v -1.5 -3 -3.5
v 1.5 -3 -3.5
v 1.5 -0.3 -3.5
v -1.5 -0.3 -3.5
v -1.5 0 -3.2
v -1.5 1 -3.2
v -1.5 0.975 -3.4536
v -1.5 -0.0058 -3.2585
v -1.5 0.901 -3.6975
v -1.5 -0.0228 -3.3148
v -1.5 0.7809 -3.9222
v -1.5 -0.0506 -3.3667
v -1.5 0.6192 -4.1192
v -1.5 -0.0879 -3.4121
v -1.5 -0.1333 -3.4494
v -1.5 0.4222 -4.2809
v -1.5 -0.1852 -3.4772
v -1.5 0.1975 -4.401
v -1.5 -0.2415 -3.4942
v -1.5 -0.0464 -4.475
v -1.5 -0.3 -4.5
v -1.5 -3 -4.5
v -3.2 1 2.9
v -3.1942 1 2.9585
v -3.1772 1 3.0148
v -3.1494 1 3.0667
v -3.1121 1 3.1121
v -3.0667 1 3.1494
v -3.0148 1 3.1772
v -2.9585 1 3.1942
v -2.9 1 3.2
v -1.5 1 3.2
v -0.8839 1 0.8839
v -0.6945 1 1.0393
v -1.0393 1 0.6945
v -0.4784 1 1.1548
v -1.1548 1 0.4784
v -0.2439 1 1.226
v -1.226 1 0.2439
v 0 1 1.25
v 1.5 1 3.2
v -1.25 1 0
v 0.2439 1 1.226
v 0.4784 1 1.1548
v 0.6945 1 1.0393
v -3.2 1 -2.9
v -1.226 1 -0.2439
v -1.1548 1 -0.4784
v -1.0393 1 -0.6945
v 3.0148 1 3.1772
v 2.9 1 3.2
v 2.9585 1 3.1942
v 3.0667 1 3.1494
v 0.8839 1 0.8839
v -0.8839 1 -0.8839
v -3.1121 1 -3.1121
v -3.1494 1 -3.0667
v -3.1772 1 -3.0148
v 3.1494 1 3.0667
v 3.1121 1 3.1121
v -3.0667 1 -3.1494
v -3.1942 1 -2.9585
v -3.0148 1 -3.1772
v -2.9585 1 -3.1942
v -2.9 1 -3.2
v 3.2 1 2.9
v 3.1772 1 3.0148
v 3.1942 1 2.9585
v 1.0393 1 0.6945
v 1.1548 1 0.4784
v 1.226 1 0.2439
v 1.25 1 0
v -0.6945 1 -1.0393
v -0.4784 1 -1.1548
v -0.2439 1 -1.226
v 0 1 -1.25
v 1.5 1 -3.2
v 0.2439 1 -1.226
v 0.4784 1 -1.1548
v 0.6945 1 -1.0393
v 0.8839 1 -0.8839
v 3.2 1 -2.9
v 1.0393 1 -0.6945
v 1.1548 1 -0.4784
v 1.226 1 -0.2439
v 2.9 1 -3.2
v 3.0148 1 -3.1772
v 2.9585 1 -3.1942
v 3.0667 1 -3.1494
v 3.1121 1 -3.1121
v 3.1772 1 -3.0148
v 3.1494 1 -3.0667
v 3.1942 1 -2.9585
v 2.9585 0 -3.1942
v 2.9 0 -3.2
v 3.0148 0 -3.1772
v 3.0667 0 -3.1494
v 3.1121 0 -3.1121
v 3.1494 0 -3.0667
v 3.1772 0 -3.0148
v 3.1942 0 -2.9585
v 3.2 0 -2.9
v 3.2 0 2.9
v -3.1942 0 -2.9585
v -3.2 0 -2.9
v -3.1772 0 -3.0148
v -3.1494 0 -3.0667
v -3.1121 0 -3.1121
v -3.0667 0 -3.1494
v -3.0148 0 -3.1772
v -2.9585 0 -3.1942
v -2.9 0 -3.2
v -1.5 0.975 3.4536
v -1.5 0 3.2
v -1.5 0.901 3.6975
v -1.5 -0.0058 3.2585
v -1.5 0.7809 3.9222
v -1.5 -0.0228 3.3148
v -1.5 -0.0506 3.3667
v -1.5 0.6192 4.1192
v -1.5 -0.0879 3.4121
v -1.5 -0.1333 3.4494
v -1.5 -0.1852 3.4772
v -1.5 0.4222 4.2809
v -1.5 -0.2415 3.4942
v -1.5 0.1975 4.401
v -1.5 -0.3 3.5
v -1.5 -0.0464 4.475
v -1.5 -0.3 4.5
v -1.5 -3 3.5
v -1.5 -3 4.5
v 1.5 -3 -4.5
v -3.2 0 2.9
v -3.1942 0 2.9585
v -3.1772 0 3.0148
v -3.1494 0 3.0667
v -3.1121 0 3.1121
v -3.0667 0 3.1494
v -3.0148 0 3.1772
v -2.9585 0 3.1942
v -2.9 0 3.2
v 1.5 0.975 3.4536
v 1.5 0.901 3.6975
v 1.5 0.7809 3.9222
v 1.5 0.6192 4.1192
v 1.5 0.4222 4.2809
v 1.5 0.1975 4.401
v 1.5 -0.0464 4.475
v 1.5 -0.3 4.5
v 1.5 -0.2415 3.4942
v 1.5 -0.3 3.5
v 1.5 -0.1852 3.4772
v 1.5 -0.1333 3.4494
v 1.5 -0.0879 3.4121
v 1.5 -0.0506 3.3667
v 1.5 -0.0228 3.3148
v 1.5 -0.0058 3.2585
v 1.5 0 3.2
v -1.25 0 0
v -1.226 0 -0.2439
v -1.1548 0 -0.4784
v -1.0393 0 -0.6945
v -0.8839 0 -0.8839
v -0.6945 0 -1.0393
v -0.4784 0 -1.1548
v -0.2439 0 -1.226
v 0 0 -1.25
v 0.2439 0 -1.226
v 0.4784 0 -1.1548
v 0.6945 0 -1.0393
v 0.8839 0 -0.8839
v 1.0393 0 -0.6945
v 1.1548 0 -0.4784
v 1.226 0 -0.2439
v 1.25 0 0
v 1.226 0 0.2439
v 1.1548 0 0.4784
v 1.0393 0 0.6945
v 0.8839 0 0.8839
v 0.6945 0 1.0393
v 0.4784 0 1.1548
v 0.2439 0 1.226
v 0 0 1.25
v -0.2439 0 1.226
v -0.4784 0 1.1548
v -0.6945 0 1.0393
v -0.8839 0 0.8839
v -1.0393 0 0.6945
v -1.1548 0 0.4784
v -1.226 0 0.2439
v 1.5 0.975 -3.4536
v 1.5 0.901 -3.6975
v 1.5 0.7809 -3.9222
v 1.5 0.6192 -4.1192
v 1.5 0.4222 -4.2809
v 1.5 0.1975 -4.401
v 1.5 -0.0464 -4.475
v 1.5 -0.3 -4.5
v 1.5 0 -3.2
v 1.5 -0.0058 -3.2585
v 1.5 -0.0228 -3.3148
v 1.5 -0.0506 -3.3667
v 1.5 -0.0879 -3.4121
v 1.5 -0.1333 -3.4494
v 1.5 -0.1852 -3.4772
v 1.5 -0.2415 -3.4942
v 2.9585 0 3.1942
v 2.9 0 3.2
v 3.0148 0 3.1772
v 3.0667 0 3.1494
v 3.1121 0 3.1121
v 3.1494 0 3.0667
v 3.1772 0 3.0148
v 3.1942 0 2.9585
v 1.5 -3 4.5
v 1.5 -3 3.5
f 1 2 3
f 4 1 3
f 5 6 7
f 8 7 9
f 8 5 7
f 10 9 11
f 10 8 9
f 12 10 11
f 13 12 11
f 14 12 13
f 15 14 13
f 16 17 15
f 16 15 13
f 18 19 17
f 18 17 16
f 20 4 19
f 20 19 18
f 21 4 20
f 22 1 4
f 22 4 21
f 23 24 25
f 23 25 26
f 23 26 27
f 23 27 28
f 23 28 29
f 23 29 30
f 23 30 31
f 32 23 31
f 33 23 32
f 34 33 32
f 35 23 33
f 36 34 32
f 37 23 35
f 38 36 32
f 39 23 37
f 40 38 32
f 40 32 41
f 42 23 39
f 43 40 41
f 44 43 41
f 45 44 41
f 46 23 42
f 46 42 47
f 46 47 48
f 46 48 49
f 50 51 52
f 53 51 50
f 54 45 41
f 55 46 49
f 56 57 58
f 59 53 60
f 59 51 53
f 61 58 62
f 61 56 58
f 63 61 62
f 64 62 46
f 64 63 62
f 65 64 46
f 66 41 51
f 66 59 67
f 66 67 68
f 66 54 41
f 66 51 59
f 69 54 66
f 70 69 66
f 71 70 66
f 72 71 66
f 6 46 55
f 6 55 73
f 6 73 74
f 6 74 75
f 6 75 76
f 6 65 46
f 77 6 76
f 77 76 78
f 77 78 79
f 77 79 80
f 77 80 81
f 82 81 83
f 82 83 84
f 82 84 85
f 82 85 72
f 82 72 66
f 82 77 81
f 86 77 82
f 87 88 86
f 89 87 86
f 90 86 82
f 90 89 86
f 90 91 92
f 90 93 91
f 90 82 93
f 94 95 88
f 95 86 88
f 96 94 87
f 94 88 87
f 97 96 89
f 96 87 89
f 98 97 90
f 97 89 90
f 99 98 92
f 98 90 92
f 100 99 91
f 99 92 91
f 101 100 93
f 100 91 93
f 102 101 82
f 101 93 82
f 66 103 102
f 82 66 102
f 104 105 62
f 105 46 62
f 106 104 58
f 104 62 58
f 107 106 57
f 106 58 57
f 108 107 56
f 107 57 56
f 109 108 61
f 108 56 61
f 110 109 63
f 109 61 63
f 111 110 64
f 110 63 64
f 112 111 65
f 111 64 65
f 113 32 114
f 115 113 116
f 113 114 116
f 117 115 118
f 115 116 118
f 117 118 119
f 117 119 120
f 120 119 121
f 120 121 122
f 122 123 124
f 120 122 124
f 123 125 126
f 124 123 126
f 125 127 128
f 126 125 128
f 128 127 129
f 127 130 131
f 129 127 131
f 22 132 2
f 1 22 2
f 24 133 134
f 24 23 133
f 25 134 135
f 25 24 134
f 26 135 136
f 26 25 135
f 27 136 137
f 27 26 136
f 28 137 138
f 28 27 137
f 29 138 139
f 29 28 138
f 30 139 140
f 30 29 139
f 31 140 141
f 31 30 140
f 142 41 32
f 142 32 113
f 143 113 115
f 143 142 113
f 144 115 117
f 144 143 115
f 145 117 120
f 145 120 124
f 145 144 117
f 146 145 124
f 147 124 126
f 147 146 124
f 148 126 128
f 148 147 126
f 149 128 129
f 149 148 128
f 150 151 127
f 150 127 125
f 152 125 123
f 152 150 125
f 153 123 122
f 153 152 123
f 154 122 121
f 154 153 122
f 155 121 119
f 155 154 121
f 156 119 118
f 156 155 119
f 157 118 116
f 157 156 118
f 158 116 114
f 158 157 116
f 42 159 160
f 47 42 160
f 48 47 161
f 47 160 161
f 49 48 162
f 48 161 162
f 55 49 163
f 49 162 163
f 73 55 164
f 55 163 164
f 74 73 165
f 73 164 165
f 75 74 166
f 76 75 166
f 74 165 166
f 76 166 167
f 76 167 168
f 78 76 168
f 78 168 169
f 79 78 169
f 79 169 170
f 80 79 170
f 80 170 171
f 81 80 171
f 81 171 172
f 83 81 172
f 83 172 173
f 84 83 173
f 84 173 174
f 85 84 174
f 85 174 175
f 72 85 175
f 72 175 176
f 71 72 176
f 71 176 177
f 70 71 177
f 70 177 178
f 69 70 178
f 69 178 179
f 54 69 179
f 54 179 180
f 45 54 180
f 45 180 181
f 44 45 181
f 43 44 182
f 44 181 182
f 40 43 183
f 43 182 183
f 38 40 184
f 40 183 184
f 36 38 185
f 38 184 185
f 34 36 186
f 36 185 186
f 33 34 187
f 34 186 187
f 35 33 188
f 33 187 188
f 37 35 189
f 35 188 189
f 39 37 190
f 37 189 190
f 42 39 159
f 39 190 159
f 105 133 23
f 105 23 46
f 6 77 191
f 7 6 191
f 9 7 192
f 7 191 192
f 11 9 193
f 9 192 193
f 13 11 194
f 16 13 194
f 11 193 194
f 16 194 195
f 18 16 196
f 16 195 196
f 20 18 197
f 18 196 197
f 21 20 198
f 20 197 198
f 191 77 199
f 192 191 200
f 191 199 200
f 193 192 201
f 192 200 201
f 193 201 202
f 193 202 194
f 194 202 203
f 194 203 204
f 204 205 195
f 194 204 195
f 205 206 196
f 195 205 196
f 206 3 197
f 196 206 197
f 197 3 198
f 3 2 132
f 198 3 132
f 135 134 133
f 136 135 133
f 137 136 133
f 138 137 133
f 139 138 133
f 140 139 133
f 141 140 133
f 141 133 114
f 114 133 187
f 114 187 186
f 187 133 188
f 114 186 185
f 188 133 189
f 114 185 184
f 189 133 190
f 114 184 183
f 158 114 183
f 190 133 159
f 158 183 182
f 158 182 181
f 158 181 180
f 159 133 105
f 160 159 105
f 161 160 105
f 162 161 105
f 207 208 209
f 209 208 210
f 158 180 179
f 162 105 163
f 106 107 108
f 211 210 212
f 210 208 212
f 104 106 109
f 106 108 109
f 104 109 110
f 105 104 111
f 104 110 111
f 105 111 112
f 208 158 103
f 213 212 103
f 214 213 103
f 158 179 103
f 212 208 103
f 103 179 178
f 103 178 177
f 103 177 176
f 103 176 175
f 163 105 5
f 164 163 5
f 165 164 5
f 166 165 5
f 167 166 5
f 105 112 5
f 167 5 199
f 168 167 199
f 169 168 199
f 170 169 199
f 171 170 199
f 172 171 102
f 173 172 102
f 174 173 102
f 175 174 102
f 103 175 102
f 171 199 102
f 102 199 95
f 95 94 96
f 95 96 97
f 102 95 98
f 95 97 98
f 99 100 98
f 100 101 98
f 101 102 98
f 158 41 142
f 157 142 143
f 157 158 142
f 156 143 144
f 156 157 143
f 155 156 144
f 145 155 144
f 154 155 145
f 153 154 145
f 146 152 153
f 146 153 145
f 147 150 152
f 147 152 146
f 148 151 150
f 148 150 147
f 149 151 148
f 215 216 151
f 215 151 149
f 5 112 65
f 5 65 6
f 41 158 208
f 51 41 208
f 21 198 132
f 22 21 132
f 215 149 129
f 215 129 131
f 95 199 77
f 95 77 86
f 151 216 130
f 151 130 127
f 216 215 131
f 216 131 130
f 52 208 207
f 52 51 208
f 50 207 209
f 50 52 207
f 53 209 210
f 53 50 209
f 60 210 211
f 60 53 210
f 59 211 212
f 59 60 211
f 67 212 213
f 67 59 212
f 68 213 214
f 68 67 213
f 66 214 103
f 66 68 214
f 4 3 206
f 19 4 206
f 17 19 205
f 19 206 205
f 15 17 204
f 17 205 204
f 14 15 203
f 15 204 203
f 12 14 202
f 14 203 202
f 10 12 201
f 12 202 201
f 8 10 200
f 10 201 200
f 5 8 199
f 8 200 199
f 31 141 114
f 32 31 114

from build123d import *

# Parameters (mm, degrees)
SKETCH1_W             = 6.4
SKETCH1_H             = 6.4
BOSS_EXTRUDE1_DEPTH   = 1
M3X0_5_TAPPED_HOLE1_D = 2.5
EDGE_FLANGE1_DEPTH    = 3
FILLET1_R             = 0.3


# Sheet-metal steps are written as plain solids
with BuildPart() as part:
    # Sketch1 → Boss-Extrude1 (new body)
    with BuildSketch(Plane(origin=(0, 0, 0), x_dir=(1, 0, 0), z_dir=(0, 1, 0))):
        Rectangle(SKETCH1_W, SKETCH1_H)
    extrude(amount=BOSS_EXTRUDE1_DEPTH)

    # M3x0.5 Tapped Hole1 (through all)
    with Locations(Plane(origin=(0, 1, 0), x_dir=(1, 0, 0), z_dir=(0, 1, 0))):
        with Locations((0, 0)):
            Hole(M3X0_5_TAPPED_HOLE1_D / 2)

    # Edge-Flange1 section (across the edge) → Edge-Flange1 (add)
    with BuildSketch(Plane(origin=(1.5, 0, 3.5), x_dir=(0, 0, -1), z_dir=(-1, 0, 0))):
        with BuildLine():
            Line((-1, 0.3), (-1, 3))
            Line((-1, 3), (0, 3))
            Line((0, 3), (0, 0.3))
            ThreePointArc((0, 0.3), (0.087867966, 0.087867966), (0.3, 0))
            Line((0.3, 0), (0.3, -1))
            ThreePointArc((0.3, -1), (-0.619238816, -0.619238816), (-1, 0.3))
        make_face()
    edge_flange1 = extrude(amount=EDGE_FLANGE1_DEPTH)

    # Mirror1: Edge-Flange1 across plane
    add(edge_flange1.mirror(Plane.XY))

    # Fillet1
    fillet1_edges = [part.edges().sort_by_distance(p)[0] for p in [
        (-3.2, 0.5, 3.2),
        (3.2, 0.5, 3.2),
        (3.2, 0.5, -3.2),
        (-3.2, 0.5, -3.2),
    ]]
    fillet(fillet1_edges, radius=FILLET1_R)


solid = part.part
